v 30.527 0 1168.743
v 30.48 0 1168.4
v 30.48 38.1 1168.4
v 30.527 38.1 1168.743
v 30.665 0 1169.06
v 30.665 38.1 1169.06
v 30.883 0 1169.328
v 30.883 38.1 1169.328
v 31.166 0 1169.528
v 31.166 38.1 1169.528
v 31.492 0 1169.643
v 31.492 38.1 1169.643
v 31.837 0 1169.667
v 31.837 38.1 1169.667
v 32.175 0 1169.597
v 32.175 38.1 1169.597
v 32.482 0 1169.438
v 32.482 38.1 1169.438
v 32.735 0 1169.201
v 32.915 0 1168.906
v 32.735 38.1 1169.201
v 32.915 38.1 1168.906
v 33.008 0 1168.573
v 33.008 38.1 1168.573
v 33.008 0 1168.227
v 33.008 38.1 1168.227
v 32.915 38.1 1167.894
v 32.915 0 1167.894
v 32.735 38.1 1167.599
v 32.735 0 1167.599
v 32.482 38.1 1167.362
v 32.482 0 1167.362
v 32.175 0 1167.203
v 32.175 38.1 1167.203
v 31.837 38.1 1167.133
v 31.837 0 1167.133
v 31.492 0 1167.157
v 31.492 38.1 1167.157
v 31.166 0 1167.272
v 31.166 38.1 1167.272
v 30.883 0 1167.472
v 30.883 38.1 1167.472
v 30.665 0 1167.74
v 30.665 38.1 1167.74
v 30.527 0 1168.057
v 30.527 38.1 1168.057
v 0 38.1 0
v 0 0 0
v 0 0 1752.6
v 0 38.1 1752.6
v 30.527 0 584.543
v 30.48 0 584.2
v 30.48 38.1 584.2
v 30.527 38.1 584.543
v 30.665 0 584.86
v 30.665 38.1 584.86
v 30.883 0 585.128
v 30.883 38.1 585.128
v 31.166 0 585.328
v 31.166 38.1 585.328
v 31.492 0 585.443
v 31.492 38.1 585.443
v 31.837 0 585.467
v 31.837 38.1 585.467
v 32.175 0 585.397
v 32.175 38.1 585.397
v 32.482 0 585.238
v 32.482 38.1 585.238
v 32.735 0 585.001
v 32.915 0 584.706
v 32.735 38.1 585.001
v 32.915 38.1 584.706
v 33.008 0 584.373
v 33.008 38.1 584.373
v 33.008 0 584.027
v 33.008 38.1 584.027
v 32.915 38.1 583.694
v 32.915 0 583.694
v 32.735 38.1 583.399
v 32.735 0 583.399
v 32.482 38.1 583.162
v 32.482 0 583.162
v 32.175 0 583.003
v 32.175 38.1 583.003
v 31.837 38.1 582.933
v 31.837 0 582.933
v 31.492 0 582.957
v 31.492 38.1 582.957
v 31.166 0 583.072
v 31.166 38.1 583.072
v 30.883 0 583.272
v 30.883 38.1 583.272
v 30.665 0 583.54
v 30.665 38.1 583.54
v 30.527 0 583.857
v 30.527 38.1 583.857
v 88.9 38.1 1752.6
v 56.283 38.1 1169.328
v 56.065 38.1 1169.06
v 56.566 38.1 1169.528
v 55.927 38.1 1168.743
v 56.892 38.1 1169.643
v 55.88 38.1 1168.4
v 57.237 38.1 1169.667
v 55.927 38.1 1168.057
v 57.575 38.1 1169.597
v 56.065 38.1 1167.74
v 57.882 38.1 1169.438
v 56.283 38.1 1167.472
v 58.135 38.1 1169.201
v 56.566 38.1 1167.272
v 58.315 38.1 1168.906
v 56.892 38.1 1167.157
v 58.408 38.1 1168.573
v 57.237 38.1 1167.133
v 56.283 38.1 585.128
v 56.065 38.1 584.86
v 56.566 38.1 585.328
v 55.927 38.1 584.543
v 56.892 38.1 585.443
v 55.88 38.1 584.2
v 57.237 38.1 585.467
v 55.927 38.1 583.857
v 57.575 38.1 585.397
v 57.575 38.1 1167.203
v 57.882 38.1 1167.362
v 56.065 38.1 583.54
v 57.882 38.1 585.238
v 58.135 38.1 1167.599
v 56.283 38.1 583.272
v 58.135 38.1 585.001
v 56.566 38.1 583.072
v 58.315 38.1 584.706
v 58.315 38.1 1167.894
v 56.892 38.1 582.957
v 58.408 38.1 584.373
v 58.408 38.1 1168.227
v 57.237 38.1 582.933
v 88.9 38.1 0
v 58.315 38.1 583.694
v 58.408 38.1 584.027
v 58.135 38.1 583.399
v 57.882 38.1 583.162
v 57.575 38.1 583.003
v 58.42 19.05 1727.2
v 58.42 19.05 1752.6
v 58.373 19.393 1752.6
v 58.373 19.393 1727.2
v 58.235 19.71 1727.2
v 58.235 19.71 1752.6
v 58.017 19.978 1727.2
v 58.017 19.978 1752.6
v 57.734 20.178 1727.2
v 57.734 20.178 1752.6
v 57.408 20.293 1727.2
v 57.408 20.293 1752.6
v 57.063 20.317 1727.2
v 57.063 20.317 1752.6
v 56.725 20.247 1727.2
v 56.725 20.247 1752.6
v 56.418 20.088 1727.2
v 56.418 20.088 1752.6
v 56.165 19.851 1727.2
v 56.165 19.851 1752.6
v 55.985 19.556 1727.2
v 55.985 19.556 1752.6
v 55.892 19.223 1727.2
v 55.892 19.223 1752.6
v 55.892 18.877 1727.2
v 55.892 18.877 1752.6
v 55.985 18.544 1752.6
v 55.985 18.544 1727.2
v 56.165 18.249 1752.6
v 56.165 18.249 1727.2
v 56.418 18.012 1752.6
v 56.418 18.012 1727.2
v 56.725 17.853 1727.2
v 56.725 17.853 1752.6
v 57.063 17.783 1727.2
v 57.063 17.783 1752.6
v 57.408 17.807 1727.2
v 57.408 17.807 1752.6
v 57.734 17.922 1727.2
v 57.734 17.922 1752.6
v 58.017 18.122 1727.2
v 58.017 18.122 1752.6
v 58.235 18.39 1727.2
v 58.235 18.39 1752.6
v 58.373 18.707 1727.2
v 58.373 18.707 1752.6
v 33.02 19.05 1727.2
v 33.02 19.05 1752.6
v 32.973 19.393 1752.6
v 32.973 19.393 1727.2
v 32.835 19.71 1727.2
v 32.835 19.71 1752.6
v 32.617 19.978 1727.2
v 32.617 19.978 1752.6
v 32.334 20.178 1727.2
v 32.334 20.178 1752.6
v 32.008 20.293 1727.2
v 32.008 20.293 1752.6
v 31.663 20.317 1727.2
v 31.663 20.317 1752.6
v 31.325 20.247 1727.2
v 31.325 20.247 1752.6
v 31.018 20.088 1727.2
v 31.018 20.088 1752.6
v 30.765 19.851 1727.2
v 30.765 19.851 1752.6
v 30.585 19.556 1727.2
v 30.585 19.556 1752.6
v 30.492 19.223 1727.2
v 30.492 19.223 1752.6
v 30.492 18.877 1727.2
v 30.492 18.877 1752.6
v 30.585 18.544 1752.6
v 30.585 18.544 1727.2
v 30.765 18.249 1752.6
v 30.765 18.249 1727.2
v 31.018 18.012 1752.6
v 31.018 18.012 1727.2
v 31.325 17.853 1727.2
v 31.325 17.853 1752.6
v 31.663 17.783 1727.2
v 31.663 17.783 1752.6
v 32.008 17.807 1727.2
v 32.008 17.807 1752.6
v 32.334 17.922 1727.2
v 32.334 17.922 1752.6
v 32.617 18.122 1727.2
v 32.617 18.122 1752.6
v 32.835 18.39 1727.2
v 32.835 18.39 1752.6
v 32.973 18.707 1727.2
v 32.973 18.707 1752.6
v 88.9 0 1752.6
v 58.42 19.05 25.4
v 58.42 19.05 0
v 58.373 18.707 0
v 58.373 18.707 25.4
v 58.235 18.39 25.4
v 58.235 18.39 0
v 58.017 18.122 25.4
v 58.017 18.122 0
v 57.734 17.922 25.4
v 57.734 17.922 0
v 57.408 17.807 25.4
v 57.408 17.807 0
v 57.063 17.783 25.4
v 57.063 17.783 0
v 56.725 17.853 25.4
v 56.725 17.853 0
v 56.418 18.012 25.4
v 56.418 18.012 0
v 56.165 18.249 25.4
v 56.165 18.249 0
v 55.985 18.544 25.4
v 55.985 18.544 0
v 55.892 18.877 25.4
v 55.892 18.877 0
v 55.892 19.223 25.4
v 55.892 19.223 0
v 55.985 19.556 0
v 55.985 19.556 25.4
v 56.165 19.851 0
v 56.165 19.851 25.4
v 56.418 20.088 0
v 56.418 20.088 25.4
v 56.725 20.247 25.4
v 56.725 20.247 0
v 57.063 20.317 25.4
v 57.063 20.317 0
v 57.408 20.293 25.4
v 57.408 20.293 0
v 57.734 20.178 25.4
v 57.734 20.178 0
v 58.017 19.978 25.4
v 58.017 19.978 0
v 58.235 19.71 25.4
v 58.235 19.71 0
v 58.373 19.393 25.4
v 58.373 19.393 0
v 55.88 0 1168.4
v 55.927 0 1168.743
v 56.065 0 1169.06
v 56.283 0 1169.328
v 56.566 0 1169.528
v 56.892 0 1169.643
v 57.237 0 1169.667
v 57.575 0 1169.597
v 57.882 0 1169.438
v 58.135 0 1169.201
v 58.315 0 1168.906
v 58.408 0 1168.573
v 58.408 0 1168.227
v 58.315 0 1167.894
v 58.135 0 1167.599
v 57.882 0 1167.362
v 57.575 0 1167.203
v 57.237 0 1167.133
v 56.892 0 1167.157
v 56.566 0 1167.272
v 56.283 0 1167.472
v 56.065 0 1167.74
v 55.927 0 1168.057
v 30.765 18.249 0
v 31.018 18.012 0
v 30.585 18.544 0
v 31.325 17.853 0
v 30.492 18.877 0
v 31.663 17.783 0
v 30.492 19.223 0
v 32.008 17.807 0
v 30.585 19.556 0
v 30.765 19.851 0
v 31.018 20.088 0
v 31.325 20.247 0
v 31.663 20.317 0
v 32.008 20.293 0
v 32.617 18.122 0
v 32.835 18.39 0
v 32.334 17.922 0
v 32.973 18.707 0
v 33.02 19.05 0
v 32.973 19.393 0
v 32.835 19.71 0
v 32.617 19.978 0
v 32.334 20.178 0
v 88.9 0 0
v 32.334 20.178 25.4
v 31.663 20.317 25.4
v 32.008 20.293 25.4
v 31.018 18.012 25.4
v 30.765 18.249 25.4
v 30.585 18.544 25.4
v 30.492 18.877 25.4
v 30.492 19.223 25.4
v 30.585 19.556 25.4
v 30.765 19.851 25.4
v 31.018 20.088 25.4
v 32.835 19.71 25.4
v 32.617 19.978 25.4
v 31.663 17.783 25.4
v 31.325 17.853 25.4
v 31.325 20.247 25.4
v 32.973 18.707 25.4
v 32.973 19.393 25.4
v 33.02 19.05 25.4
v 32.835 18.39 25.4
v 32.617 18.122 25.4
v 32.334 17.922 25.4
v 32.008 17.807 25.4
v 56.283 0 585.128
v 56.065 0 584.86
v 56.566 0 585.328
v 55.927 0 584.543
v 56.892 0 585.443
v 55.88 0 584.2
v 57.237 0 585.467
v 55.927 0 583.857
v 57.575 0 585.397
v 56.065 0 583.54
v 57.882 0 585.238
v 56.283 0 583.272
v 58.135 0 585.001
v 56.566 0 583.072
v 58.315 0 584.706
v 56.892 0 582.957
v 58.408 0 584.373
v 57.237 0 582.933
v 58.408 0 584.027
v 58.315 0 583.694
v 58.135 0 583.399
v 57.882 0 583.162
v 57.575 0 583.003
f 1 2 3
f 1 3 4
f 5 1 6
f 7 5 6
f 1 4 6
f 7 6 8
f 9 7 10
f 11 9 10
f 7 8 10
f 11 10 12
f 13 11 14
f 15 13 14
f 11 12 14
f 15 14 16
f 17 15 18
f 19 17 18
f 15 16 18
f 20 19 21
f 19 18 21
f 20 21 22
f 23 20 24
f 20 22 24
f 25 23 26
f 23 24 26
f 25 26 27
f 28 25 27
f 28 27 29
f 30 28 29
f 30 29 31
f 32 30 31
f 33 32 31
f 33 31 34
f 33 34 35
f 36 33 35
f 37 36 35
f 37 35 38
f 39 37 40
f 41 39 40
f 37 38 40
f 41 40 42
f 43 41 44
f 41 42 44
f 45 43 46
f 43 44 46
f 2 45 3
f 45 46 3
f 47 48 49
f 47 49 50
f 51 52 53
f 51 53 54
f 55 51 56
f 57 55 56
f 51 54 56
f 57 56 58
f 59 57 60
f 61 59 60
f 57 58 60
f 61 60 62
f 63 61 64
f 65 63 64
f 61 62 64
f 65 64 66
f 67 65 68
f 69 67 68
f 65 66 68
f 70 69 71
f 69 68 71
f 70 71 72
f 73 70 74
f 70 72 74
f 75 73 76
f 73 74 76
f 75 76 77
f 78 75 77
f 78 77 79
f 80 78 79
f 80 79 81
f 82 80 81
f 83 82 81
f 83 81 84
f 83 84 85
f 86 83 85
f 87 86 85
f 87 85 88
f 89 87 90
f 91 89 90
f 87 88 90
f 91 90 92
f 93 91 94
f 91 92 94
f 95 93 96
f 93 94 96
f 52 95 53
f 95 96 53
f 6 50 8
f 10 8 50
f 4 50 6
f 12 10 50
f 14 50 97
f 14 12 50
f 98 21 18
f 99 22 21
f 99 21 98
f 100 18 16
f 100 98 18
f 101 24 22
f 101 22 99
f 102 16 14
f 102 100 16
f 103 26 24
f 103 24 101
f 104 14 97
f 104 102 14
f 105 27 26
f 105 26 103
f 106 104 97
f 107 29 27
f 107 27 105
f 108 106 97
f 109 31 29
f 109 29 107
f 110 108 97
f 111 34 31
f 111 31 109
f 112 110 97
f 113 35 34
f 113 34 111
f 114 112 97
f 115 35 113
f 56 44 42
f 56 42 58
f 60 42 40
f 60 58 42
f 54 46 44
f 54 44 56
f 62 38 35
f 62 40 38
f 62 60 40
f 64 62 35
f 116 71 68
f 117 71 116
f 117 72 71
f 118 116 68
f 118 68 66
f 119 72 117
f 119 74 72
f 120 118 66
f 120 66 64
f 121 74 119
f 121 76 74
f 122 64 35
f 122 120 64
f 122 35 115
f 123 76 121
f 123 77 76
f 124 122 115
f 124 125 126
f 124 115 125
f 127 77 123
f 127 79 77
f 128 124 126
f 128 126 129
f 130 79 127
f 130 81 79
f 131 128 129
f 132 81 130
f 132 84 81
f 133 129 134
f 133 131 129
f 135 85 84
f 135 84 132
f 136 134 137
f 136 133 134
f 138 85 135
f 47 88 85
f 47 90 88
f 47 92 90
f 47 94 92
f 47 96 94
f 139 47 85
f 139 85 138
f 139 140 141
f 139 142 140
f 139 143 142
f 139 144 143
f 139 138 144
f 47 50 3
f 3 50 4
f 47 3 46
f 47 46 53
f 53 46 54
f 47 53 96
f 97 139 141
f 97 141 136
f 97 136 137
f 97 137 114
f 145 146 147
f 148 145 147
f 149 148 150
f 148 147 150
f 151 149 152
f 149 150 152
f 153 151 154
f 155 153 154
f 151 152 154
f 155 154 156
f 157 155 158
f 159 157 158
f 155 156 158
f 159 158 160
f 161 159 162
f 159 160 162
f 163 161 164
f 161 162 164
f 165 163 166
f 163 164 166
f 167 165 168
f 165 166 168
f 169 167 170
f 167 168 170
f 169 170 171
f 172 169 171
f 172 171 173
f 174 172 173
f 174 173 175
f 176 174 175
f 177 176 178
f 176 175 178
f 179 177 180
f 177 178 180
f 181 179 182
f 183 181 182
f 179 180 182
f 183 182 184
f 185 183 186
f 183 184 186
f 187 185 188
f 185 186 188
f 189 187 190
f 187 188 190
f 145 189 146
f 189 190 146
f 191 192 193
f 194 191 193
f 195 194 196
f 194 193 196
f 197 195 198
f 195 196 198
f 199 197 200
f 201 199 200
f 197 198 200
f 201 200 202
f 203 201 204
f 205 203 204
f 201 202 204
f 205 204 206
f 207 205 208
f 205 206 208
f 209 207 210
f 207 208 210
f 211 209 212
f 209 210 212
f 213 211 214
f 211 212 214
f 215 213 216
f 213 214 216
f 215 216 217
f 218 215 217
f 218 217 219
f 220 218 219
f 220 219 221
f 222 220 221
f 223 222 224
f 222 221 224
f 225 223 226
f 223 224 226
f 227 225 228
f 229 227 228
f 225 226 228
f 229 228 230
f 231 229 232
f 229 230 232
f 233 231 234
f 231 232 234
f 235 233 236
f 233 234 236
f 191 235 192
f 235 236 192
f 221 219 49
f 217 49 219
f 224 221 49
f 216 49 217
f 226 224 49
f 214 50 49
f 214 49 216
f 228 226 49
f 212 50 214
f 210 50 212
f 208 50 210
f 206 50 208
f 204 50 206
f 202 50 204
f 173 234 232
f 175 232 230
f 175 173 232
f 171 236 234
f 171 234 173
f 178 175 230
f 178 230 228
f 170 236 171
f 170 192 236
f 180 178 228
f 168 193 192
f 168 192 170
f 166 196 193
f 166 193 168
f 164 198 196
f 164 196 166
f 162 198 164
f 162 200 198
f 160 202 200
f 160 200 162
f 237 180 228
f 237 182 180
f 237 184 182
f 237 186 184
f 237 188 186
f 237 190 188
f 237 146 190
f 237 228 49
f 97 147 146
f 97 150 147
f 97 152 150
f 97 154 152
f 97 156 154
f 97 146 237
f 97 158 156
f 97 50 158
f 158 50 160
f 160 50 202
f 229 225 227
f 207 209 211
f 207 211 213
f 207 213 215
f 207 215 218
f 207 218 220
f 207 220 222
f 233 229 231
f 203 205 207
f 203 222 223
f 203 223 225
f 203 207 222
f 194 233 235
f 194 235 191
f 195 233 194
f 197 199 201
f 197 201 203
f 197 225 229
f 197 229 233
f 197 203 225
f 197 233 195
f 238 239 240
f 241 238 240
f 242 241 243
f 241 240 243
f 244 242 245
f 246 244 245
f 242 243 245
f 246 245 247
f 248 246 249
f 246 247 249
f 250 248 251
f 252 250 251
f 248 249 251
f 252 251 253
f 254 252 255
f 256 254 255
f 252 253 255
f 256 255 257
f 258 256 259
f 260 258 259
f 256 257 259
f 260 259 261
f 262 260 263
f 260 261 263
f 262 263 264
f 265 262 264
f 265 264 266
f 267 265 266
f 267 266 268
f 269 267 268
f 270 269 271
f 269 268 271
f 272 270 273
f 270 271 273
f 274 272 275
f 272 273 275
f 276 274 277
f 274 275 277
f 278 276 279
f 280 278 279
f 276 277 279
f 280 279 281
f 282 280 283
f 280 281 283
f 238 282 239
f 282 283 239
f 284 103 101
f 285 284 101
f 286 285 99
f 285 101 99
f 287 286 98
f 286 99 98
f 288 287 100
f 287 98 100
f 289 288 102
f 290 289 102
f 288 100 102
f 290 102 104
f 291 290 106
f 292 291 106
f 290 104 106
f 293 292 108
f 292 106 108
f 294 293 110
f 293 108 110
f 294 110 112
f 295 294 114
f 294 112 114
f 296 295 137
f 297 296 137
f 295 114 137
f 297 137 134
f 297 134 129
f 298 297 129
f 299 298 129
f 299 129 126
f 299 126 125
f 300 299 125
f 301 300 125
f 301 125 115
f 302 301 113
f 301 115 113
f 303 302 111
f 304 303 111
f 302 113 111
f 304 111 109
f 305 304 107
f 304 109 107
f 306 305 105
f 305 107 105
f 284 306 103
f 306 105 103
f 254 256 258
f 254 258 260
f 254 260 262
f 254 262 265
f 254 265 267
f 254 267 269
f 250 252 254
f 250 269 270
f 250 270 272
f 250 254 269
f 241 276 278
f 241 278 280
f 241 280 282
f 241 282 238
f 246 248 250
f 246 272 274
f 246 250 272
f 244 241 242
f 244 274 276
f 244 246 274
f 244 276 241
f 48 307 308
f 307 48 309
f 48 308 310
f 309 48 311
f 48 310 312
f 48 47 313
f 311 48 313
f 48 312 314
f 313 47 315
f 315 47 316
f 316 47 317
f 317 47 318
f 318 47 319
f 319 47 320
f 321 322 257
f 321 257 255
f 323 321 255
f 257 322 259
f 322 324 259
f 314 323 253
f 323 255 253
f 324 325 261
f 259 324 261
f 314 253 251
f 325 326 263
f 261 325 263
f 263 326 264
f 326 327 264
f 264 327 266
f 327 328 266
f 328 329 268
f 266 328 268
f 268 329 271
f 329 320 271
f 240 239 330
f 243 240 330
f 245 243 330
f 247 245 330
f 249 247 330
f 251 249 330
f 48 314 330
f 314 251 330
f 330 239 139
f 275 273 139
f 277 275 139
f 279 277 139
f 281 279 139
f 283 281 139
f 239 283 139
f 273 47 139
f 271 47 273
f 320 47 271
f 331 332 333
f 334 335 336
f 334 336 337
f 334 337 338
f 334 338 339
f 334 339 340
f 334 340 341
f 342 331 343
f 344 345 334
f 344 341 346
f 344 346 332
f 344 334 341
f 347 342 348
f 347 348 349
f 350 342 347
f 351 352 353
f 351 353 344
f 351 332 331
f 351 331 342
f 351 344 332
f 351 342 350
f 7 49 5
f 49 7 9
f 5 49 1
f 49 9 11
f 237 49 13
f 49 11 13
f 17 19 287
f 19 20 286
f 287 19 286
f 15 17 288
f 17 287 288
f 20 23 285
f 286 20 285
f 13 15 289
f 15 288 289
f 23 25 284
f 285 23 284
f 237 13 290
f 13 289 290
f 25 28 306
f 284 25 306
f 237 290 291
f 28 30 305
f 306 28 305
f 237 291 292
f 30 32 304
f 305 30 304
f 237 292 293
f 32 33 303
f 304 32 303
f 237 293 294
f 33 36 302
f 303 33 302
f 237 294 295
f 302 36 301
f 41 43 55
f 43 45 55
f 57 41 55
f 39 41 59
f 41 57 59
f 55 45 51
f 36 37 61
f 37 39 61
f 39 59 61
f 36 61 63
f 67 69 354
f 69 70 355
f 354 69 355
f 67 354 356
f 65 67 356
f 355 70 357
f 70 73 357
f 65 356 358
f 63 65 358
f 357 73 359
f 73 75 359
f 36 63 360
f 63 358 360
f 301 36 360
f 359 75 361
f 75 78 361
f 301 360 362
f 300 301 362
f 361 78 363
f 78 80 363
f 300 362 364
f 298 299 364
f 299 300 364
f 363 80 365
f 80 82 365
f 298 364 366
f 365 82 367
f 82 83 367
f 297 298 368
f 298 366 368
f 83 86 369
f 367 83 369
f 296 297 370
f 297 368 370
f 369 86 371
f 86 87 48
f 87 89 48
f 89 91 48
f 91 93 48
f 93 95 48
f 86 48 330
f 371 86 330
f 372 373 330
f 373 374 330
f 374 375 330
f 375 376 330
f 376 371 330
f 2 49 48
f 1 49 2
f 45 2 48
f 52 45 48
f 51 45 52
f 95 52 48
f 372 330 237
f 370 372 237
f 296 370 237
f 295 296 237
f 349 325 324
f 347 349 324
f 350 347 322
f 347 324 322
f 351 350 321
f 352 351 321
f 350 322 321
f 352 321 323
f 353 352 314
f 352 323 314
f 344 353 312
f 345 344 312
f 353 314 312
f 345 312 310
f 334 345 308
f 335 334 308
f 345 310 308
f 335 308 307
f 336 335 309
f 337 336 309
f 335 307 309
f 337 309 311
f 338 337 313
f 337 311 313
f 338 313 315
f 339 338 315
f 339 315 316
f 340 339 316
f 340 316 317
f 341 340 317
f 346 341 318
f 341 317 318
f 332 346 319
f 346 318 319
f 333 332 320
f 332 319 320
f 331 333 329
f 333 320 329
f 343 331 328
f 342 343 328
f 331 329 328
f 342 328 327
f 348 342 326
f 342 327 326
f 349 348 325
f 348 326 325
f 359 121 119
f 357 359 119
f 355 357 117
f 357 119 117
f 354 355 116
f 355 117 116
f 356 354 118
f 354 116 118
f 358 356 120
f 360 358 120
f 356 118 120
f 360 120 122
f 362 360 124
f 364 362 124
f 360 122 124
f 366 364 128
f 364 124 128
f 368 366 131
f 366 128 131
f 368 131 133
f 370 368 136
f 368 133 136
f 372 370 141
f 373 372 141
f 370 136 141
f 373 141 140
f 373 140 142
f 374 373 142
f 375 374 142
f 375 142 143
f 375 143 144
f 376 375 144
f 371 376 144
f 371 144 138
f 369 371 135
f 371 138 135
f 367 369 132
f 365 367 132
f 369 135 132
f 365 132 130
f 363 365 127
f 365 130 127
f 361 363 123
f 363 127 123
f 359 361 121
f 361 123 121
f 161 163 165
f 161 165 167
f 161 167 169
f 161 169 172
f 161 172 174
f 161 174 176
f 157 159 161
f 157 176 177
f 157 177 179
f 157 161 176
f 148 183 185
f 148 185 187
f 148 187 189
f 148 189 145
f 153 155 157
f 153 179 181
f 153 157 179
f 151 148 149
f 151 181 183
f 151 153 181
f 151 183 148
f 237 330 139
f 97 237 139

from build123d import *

# Parameters (mm, degrees)
SKETCH003_AS_DRAWN_R                      = 1.27
EXTRUDE003_DEPTH                          = 38.1
EXTRUDE003_ONTO_SKETCH003_ROLL_ANGLE      = 90
EXTRUDE003_ONTO_SKETCH003_PLACEMENT_ANGLE = 180
SKETCH002_R                               = 1.27
EXTRUDE002_DEPTH                          = 25.4
SKETCH001_R                               = 1.27
EXTRUDE001_DEPTH                          = 25.4
SKETCH_W                                  = 88.9
SKETCH_H                                  = 38.1
EXTRUDE_DEPTH                             = 1752.6


with BuildPart() as extrude003:
    # Sketch003 as drawn → Extrude003 (new)
    with BuildSketch(Plane.XY):
        with Locations((-57.15, 584.2)):
            Circle(SKETCH003_AS_DRAWN_R)
        with Locations((-31.75, 584.2)):
            Circle(SKETCH003_AS_DRAWN_R)
        with Locations((-57.15, 1168.4)):
            Circle(SKETCH003_AS_DRAWN_R)
        with Locations((-31.75, 1168.4)):
            Circle(SKETCH003_AS_DRAWN_R)
    extrude(amount=-EXTRUDE003_DEPTH)


with BuildPart() as extrude003_1:
    # Extrude003 onto Sketch003 roll: moved
    add(extrude003.part.rotate(Axis((0, 0, 0), (1, 0, 0)), EXTRUDE003_ONTO_SKETCH003_ROLL_ANGLE))


with BuildPart() as extrude003_2:
    # Extrude003 onto Sketch003 placement: moved
    add(extrude003_1.part.moved(Location((0, 38.1, 0))).rotate(Axis((0, 38.1, 0), (0, 0, 1)), EXTRUDE003_ONTO_SKETCH003_PLACEMENT_ANGLE))


with BuildPart() as extrude002:
    # Sketch002 → Extrude002 (new body)
    with BuildSketch(Plane(origin=(0, 0, 0), x_dir=(1, 0, 0), z_dir=(0, 0, -1))):
        with Locations((31.75, -19.05)):
            Circle(SKETCH002_R)
        with Locations((57.15, -19.05)):
            Circle(SKETCH002_R)
    extrude(amount=-EXTRUDE002_DEPTH)


with BuildPart() as extrude001:
    # Sketch001 → Extrude001 (new body)
    with BuildSketch(Plane.XY.offset(1752.6)):
        with Locations((31.75, 19.05)):
            Circle(SKETCH001_R)
        with Locations((57.15, 19.05)):
            Circle(SKETCH001_R)
    extrude(amount=-EXTRUDE001_DEPTH)


with BuildPart() as cut002:
    # Sketch → Extrude (new body)
    with BuildSketch(Plane.XY):
        with Locations((44.45, 19.05)):
            Rectangle(SKETCH_W, SKETCH_H)
    extrude(amount=EXTRUDE_DEPTH)

    # Cut: cut Extrude001
    add(extrude001.part, mode=Mode.SUBTRACT)

    # Cut001: cut Extrude002
    add(extrude002.part, mode=Mode.SUBTRACT)

    # Cut002: cut Extrude003
    add(extrude003_2.part, mode=Mode.SUBTRACT)


solid = cut002.part
